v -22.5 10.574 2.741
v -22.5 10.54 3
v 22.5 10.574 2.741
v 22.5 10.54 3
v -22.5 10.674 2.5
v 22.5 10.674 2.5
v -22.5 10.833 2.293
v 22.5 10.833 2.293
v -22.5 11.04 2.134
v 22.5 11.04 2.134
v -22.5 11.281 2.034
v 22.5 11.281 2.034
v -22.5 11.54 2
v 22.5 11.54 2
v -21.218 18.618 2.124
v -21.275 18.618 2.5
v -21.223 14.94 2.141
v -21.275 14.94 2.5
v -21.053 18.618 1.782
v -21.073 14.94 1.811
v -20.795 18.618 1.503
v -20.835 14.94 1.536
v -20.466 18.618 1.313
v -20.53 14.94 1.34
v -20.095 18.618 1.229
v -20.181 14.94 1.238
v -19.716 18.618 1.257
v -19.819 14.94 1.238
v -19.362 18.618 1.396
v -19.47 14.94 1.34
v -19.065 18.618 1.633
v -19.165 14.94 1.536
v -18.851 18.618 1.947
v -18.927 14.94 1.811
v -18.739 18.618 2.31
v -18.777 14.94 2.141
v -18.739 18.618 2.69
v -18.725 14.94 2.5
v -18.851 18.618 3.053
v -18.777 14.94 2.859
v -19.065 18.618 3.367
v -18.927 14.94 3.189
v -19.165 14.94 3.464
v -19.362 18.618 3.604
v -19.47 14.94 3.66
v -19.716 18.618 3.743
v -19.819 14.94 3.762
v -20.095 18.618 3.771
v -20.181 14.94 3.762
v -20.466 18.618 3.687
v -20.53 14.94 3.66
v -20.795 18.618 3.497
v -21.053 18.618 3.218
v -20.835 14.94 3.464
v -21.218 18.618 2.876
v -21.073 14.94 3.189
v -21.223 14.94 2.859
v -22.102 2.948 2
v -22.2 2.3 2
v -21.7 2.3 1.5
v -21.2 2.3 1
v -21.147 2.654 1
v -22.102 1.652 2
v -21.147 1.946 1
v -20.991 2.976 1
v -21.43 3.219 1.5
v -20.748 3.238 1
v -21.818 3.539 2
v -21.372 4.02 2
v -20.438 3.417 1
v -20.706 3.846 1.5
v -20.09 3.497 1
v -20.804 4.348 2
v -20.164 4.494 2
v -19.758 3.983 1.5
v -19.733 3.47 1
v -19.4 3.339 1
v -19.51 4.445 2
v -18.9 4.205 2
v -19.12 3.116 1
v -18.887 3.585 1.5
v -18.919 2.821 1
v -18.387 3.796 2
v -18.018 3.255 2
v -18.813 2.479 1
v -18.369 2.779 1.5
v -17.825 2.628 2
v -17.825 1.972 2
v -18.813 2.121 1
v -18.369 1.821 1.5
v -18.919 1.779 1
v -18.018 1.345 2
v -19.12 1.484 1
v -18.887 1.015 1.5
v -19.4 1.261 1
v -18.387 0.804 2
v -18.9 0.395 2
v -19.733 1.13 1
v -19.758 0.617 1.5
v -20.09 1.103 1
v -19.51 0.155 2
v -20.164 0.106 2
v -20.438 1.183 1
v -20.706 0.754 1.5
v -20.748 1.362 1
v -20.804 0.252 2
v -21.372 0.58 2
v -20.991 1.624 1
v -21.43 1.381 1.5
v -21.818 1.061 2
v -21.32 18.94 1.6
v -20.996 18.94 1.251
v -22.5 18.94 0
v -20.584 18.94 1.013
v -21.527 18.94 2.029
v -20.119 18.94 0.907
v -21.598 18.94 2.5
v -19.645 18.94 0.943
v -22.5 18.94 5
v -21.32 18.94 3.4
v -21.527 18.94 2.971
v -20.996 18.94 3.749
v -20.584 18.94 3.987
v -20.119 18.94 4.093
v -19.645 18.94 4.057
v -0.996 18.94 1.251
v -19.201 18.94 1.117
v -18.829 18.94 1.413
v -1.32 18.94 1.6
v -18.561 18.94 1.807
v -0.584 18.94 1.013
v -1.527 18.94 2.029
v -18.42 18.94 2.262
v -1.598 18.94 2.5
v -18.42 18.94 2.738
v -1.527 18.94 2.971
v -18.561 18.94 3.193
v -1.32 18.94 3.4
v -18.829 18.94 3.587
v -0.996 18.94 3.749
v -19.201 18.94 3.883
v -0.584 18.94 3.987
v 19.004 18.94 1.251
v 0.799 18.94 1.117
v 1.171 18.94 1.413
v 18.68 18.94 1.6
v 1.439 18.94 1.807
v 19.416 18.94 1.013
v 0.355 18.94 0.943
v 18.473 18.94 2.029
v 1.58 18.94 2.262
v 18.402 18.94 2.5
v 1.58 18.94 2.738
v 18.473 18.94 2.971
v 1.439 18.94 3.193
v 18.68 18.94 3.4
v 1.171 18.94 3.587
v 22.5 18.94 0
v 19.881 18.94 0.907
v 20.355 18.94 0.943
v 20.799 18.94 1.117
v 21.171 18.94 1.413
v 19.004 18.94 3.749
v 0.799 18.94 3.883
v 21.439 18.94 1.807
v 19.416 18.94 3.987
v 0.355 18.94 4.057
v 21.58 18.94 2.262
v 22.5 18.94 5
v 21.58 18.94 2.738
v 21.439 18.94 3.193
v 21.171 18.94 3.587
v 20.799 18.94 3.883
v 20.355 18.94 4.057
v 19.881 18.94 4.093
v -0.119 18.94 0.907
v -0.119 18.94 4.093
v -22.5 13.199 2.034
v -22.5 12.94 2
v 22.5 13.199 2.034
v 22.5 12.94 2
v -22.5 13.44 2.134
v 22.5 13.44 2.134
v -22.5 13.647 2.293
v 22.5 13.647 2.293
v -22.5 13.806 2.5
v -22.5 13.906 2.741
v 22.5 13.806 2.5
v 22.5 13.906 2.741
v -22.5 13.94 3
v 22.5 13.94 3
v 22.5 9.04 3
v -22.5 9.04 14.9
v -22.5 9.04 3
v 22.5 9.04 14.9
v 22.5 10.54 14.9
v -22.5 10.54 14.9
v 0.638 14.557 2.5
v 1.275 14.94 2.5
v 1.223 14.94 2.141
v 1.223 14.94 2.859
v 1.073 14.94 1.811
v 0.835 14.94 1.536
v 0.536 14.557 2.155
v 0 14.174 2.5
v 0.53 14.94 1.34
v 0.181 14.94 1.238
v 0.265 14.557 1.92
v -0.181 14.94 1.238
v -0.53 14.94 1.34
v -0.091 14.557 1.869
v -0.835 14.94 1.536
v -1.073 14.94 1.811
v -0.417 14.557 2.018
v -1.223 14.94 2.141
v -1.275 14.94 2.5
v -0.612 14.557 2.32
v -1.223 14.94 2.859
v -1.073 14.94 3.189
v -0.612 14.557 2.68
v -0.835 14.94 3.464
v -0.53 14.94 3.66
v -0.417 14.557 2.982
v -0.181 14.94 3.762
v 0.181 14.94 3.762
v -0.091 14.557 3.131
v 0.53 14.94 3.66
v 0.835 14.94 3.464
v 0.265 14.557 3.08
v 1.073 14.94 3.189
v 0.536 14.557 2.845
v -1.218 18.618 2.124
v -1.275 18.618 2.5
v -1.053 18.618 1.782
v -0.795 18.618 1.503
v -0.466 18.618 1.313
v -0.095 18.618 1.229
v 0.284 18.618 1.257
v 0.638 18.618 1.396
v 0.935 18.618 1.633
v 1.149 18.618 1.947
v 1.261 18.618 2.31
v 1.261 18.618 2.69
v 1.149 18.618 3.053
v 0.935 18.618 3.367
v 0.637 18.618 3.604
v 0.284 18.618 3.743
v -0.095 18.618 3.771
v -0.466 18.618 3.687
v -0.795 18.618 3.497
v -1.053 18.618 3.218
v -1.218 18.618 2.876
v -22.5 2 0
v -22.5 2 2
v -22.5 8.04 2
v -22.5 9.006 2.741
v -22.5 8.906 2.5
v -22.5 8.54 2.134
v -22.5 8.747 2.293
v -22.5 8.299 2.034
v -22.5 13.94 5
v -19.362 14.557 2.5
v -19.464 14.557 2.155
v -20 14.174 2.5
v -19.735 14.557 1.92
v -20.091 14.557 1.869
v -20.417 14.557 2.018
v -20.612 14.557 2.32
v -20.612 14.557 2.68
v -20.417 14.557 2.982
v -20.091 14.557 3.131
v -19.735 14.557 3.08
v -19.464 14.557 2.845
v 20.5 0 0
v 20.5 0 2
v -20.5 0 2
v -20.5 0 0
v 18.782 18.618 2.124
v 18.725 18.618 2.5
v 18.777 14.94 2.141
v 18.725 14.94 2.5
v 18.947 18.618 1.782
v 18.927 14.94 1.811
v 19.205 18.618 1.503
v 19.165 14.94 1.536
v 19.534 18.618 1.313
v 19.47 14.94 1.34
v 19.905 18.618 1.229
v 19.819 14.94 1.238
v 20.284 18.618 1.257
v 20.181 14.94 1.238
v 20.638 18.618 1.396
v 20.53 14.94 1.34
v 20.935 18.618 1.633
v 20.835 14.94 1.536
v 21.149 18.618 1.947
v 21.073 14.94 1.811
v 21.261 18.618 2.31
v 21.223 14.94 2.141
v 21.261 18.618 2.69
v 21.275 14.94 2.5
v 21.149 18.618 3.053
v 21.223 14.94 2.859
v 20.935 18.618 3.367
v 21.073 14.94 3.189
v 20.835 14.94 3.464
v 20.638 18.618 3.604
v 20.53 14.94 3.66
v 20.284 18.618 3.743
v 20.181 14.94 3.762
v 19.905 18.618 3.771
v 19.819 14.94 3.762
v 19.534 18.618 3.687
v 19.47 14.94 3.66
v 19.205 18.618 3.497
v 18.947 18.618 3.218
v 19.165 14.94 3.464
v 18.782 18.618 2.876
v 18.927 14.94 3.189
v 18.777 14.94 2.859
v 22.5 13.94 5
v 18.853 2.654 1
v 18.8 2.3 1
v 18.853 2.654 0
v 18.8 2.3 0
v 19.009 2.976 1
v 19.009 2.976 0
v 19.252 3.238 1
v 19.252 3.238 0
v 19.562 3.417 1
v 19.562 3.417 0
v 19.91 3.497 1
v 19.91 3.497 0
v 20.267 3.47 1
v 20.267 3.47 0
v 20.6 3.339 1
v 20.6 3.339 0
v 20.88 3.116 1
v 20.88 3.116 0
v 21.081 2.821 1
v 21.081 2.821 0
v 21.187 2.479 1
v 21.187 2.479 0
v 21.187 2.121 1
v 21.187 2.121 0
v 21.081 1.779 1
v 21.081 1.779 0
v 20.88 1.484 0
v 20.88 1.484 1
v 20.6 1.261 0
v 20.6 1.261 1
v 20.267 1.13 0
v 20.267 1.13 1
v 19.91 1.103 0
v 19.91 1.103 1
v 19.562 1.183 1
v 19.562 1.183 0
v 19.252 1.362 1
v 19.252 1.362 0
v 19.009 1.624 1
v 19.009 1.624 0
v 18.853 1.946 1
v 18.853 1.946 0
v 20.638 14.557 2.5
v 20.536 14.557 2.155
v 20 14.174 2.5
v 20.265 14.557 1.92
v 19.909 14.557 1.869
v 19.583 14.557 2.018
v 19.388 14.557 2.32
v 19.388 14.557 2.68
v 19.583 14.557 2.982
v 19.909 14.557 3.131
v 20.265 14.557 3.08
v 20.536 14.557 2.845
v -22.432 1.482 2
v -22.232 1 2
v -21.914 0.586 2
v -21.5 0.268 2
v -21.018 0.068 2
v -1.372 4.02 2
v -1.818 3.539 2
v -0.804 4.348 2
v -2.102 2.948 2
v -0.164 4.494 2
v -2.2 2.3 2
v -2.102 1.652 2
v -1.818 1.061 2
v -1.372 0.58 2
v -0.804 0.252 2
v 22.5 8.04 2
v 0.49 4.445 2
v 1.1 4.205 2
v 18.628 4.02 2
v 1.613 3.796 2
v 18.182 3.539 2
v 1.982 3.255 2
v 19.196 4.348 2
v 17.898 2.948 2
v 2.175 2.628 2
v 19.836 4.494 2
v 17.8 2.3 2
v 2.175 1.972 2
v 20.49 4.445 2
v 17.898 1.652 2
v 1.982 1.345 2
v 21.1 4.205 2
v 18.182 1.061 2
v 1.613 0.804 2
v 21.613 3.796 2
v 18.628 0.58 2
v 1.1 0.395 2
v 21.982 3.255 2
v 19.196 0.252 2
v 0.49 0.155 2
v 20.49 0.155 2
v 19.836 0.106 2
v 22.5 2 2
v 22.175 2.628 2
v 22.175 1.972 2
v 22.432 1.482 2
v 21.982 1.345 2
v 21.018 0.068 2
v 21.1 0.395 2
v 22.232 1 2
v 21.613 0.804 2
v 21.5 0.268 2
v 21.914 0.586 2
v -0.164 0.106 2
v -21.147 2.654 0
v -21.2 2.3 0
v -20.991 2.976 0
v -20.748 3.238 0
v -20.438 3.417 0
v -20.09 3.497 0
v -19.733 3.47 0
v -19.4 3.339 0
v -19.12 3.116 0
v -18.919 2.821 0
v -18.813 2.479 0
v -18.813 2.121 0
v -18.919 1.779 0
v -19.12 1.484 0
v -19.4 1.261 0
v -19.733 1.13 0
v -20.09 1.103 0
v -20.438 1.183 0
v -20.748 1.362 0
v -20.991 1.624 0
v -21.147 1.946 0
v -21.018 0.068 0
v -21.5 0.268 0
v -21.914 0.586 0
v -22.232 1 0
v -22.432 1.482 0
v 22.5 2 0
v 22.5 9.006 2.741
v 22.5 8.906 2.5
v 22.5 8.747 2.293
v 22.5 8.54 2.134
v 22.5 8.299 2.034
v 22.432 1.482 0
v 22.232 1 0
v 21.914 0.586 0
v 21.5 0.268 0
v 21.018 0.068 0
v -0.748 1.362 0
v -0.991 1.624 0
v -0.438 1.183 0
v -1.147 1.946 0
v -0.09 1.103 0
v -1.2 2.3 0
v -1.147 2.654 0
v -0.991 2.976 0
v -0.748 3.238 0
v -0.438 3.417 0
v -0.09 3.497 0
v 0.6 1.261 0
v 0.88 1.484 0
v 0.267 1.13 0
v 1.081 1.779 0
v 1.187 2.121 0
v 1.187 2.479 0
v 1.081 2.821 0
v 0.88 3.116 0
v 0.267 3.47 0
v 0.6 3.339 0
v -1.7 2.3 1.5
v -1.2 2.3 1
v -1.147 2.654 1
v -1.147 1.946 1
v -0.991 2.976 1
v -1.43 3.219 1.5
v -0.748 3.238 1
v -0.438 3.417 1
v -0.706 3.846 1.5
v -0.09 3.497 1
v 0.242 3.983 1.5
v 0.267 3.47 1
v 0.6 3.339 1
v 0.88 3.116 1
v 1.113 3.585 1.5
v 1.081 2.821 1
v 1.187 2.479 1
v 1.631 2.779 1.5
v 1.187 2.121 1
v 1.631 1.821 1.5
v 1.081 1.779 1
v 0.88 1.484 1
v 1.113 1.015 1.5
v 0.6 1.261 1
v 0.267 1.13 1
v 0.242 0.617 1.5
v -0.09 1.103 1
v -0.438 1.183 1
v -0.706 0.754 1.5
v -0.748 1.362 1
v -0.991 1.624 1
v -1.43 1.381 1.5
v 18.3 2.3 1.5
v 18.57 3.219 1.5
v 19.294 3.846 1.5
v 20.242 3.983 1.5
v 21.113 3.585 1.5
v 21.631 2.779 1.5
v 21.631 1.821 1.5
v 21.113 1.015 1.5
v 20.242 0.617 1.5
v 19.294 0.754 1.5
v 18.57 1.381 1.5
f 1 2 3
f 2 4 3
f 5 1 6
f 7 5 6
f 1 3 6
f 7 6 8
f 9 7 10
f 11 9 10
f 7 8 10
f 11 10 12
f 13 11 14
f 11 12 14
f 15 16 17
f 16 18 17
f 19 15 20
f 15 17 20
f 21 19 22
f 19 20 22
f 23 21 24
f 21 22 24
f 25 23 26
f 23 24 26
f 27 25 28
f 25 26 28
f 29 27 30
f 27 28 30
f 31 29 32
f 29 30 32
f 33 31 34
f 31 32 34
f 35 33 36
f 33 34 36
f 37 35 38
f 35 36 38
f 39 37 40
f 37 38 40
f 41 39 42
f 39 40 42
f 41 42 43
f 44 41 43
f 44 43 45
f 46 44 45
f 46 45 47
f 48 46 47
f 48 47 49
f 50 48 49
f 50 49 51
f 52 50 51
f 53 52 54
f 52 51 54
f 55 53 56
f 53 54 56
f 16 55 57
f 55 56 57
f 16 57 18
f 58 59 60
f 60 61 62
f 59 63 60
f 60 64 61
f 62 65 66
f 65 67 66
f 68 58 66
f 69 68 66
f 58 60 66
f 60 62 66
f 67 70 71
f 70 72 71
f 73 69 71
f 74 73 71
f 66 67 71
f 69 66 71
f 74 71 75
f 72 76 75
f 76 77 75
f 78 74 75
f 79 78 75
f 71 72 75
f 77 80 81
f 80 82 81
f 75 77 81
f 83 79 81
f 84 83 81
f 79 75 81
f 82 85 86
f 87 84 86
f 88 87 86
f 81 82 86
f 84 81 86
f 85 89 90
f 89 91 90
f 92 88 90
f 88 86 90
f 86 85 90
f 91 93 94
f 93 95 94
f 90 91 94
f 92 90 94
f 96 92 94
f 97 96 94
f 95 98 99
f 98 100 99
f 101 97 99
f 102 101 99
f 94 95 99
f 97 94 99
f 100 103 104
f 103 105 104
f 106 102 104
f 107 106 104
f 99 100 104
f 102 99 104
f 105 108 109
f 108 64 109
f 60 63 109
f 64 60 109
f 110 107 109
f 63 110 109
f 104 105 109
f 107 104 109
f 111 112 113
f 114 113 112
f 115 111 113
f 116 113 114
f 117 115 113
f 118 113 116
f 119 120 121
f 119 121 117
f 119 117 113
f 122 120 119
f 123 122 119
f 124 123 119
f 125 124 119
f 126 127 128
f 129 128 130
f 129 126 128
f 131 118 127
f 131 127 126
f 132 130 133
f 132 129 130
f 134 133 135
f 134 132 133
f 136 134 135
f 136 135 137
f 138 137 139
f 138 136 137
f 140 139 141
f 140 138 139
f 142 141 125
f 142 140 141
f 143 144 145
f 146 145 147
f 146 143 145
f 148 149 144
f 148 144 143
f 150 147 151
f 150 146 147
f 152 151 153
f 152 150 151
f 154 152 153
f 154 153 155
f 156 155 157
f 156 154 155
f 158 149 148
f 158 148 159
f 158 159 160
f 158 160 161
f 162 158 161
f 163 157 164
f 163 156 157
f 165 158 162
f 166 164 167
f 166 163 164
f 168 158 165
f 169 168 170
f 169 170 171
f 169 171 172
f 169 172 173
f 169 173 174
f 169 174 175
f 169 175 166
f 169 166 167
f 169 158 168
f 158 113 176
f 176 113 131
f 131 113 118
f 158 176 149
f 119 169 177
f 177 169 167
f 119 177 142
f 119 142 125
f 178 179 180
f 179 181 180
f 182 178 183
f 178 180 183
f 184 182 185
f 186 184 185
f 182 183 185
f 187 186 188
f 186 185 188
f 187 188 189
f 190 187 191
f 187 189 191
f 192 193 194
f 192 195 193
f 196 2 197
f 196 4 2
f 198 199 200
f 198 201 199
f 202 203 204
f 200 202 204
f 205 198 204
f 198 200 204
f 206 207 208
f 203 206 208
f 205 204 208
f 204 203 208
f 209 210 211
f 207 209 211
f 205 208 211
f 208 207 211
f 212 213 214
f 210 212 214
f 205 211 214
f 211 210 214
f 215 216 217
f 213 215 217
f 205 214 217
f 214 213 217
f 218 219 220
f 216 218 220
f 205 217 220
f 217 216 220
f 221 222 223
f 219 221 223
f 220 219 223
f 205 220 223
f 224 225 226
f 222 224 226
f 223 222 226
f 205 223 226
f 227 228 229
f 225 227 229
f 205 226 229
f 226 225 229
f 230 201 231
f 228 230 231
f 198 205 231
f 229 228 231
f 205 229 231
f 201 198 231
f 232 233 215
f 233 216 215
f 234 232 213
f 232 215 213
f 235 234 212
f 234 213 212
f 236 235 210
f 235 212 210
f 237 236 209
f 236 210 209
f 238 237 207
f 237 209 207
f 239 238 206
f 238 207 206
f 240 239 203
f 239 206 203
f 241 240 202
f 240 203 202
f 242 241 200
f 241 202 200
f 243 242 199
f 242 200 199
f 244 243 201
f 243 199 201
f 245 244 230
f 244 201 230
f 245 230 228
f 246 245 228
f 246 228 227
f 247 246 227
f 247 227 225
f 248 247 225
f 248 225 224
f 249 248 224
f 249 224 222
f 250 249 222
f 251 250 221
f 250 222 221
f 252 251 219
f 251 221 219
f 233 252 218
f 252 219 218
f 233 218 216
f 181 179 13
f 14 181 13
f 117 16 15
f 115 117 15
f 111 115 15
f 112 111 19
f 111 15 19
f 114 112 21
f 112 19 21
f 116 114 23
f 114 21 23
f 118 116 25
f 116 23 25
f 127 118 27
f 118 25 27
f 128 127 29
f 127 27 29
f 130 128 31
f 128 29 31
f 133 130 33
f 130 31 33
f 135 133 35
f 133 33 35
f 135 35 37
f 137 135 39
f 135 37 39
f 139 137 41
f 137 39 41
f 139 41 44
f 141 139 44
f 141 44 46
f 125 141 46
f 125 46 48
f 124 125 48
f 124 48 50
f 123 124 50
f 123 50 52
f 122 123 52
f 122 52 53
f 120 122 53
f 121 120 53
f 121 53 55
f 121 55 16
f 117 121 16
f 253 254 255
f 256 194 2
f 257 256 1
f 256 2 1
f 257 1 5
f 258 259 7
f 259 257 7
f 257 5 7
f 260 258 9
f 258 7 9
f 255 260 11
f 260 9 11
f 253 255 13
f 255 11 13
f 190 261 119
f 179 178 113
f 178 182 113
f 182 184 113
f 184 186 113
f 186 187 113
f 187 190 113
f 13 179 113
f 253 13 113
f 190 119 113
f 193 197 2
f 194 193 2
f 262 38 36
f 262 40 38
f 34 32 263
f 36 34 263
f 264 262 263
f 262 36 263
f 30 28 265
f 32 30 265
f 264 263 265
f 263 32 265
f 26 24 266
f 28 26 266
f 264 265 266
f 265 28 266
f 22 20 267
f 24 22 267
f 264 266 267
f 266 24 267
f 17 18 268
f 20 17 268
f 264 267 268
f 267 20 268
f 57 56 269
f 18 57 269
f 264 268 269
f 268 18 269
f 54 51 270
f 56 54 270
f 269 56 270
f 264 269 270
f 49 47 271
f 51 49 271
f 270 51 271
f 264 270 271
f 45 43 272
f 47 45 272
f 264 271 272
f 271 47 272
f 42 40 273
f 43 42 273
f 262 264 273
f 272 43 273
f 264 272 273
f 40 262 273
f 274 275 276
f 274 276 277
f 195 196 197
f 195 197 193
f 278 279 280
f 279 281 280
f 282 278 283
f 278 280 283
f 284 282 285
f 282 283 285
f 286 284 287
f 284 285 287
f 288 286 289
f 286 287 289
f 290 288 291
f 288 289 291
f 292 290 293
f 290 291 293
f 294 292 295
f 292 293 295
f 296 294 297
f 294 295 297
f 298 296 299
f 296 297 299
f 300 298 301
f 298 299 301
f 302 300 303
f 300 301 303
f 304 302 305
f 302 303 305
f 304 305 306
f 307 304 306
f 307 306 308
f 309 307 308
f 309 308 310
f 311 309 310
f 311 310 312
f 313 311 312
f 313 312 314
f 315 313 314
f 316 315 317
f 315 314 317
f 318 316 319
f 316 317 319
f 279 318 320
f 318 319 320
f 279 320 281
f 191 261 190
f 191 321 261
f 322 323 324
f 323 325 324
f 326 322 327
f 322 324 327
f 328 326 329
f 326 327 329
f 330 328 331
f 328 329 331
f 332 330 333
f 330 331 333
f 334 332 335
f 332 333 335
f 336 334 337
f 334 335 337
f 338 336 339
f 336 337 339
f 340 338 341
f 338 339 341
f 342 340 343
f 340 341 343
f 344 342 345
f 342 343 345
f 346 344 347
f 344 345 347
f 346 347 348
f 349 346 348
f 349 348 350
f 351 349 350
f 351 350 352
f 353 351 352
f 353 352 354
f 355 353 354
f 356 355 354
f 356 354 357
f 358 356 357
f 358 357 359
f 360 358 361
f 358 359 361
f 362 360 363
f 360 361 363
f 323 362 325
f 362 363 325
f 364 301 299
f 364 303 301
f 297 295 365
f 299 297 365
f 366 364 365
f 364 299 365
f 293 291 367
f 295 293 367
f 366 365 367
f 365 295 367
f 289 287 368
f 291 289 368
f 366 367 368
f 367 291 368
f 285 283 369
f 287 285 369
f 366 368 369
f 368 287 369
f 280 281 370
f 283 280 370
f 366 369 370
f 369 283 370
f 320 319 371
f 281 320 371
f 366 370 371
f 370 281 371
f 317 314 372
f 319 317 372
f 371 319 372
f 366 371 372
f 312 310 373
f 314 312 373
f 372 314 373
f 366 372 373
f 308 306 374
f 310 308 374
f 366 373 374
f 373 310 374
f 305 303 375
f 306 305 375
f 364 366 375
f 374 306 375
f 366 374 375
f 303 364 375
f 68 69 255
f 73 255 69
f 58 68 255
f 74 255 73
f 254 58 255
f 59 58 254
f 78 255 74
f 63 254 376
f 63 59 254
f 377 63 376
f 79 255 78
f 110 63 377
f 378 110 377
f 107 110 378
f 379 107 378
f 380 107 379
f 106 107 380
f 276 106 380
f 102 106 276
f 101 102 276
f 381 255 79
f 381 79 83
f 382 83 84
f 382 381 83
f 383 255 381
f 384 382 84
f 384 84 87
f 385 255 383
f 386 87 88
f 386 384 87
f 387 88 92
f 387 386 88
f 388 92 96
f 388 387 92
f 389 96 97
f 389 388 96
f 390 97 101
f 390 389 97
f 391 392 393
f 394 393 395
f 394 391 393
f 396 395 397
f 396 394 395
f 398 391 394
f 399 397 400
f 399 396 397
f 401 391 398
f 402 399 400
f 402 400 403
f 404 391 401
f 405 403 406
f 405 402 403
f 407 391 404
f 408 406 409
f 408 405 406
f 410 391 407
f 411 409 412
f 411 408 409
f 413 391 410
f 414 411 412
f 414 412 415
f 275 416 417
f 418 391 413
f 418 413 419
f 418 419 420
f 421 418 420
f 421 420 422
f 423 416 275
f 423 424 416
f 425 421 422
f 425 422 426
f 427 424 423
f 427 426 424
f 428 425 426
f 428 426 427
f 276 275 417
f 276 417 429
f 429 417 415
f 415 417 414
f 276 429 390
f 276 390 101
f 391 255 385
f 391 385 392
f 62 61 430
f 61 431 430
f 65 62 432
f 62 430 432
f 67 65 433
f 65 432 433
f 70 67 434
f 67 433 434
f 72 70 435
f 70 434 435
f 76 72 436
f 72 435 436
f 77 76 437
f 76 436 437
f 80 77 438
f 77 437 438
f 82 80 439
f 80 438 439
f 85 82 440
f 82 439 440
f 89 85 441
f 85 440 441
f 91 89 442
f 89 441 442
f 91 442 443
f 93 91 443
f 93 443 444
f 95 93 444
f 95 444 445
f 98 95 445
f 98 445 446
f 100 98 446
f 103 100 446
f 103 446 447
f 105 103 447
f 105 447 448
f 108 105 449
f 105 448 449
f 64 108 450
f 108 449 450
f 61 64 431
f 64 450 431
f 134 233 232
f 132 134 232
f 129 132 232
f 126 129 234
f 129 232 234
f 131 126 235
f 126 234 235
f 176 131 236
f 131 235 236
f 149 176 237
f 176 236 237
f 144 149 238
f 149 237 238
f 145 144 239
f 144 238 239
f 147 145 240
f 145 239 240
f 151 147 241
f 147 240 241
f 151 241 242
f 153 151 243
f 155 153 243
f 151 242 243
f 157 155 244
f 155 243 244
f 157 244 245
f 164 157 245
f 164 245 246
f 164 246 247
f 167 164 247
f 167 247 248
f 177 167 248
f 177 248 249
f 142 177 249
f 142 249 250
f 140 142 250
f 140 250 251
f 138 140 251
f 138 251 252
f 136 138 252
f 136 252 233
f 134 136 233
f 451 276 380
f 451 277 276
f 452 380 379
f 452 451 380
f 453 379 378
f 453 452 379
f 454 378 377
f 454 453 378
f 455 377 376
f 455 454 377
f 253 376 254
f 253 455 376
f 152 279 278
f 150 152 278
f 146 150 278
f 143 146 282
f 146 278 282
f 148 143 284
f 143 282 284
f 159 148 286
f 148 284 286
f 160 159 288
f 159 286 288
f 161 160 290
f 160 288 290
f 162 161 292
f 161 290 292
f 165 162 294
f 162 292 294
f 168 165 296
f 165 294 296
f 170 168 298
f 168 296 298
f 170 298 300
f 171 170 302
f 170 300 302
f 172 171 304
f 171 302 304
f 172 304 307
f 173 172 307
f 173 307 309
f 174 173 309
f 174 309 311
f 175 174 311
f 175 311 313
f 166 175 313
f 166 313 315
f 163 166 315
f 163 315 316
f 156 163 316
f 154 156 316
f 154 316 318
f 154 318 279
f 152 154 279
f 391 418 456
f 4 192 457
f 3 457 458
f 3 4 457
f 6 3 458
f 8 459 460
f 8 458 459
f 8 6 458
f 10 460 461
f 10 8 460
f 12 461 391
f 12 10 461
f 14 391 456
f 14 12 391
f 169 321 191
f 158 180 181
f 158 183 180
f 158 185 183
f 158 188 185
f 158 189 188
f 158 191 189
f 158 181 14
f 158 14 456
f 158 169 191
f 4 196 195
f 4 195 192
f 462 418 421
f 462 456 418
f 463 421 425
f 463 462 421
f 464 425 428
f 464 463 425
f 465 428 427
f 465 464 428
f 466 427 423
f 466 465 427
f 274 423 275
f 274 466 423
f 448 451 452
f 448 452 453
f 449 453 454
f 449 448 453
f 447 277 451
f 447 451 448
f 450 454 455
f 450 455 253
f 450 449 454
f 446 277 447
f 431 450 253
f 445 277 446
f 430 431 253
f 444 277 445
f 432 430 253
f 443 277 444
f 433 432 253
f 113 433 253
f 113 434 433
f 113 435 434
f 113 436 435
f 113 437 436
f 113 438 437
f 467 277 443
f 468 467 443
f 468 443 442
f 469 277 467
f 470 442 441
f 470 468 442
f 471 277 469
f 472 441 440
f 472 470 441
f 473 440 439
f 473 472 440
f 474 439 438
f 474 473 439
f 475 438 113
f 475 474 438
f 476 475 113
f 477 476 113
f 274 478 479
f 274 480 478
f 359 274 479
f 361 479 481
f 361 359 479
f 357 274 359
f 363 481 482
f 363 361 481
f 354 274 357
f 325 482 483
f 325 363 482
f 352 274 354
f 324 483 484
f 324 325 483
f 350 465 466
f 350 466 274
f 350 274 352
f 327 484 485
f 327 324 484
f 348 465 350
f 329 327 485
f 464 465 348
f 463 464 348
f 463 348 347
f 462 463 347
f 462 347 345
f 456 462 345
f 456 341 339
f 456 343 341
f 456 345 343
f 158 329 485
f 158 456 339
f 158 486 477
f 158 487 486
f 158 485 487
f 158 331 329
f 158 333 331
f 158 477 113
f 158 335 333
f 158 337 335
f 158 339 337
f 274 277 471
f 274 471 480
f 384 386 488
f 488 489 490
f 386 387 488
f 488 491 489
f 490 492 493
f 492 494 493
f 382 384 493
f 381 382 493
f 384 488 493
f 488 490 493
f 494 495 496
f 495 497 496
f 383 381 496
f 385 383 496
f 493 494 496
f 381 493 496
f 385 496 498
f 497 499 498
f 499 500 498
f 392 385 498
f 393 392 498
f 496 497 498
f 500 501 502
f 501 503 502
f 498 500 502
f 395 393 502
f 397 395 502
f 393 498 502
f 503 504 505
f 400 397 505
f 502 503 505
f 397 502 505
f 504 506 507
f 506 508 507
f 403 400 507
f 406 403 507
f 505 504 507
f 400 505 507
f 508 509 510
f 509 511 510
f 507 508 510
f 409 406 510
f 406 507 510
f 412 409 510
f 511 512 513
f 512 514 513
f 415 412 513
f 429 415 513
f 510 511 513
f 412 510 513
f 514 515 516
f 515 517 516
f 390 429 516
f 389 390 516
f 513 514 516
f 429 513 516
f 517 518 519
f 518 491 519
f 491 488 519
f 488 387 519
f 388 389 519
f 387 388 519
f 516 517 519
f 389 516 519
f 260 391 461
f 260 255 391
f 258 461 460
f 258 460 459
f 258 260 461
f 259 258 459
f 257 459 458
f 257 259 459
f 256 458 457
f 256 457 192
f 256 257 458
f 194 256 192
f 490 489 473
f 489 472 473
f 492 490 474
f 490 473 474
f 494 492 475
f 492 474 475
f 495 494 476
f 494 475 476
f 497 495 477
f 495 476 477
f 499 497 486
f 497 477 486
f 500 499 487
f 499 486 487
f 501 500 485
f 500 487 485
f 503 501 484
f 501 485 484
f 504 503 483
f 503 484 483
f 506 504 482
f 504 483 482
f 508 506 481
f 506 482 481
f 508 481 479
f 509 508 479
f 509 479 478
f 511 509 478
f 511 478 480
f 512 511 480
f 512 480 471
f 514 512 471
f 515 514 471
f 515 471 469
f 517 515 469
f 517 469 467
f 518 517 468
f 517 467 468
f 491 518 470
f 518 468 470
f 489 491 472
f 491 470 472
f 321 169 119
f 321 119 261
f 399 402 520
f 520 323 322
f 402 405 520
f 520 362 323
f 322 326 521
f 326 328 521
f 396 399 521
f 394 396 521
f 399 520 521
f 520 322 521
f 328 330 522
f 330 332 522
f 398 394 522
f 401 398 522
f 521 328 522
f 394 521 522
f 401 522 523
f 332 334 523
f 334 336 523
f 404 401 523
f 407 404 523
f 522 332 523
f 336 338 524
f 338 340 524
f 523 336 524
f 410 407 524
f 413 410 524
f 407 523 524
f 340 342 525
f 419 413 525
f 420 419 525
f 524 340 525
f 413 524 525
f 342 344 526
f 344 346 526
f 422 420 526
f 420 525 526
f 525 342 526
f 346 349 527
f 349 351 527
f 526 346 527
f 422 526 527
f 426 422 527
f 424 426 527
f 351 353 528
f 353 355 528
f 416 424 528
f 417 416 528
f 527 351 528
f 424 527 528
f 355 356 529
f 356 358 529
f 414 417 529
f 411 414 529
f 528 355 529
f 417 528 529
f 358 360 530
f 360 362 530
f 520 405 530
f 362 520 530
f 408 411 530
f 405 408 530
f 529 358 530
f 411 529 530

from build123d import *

# Parameters (mm, degrees)
BOSS_EXTRUDE1_DEPTH                             = 22.5
FILLET1_R                                       = 1
CSK_FOR_M2_FLAT_HEAD_MACHINE_SCREW1_D           = 2.4
CSK_FOR_M2_FLAT_HEAD_MACHINE_SCREW1_DEPTH       = 6.45
CSK_FOR_M2_FLAT_HEAD_MACHINE_SCREW1_CSINK_D     = 4.4
CSK_FOR_M2_FLAT_HEAD_MACHINE_SCREW1_CSINK_ANGLE = 90
CSK_FOR_M2_FLAT_HEAD_MACHINE_SCREW1_TIP         = 0.721032743
FILLET2_R                                       = 2
TAPPED_HOLE_FOR_M2_5X0_45_HELICOIL1_D           = 2.55
TAPPED_HOLE_FOR_M2_5X0_45_HELICOIL1_DEPTH       = 4
TAPPED_HOLE_FOR_M2_5X0_45_HELICOIL1_CSINK_D     = 3.195
TAPPED_HOLE_FOR_M2_5X0_45_HELICOIL1_CSINK_ANGLE = 90
TAPPED_HOLE_FOR_M2_5X0_45_HELICOIL1_TIP         = 0.766097289


with BuildPart() as part:
    # Sketch1 → Boss-Extrude1 (new, symmetric)
    with BuildSketch(Plane(origin=(0, 0, 0), x_dir=(0, 0, -1), z_dir=(1, 0, 0))):
        Polygon((0, 0), (0, 18.94), (-5, 18.94), (-5, 13.94), (-2, 13.94), (-2, 10.54), (-14.9, 10.54), (-14.9, 9.04), (-2, 9.04), (-2, 0), align=None)
    extrude(amount=BOSS_EXTRUDE1_DEPTH, both=True)

    # Fillet1
    fillet1_edges = [part.edges().sort_by_distance(p)[0] for p in [
        (0, 9.04, 2),
        (0, 10.54, 2),
        (0, 13.94, 2),
    ]]
    fillet(fillet1_edges, radius=FILLET1_R)

    # CSK for M2 Flat Head Machine Screw1
    with Locations(Plane.XY.offset(2)):
        with Locations((20, 2.3), (-20, 2.3), (0, 2.3)):
            CounterSinkHole(CSK_FOR_M2_FLAT_HEAD_MACHINE_SCREW1_D / 2, CSK_FOR_M2_FLAT_HEAD_MACHINE_SCREW1_CSINK_D / 2, depth=CSK_FOR_M2_FLAT_HEAD_MACHINE_SCREW1_DEPTH, counter_sink_angle=CSK_FOR_M2_FLAT_HEAD_MACHINE_SCREW1_CSINK_ANGLE)
            with Locations((0, 0, -(CSK_FOR_M2_FLAT_HEAD_MACHINE_SCREW1_DEPTH + CSK_FOR_M2_FLAT_HEAD_MACHINE_SCREW1_TIP / 2))):  # 118° drill point
                Cone(0, CSK_FOR_M2_FLAT_HEAD_MACHINE_SCREW1_D / 2, CSK_FOR_M2_FLAT_HEAD_MACHINE_SCREW1_TIP, mode=Mode.SUBTRACT)

    # Fillet2
    fillet2_edges = [part.edges().sort_by_distance(p)[0] for p in [
        (-22.5, 0, 1),
        (22.5, 0, 1),
    ]]
    fillet(fillet2_edges, radius=FILLET2_R)

    # Tapped Hole for M2.5x0.45 Helicoil1
    with Locations(Plane(origin=(0, 18.94, 0), x_dir=(1, 0, 0), z_dir=(0, 1, 0))):
        with Locations((20, -2.5), (-20, -2.5), (0, -2.5)):
            CounterSinkHole(TAPPED_HOLE_FOR_M2_5X0_45_HELICOIL1_D / 2, TAPPED_HOLE_FOR_M2_5X0_45_HELICOIL1_CSINK_D / 2, depth=TAPPED_HOLE_FOR_M2_5X0_45_HELICOIL1_DEPTH, counter_sink_angle=TAPPED_HOLE_FOR_M2_5X0_45_HELICOIL1_CSINK_ANGLE)
            with Locations((0, 0, -(TAPPED_HOLE_FOR_M2_5X0_45_HELICOIL1_DEPTH + TAPPED_HOLE_FOR_M2_5X0_45_HELICOIL1_TIP / 2))):  # 118° drill point
                Cone(0, TAPPED_HOLE_FOR_M2_5X0_45_HELICOIL1_D / 2, TAPPED_HOLE_FOR_M2_5X0_45_HELICOIL1_TIP, mode=Mode.SUBTRACT)


solid = part.part
